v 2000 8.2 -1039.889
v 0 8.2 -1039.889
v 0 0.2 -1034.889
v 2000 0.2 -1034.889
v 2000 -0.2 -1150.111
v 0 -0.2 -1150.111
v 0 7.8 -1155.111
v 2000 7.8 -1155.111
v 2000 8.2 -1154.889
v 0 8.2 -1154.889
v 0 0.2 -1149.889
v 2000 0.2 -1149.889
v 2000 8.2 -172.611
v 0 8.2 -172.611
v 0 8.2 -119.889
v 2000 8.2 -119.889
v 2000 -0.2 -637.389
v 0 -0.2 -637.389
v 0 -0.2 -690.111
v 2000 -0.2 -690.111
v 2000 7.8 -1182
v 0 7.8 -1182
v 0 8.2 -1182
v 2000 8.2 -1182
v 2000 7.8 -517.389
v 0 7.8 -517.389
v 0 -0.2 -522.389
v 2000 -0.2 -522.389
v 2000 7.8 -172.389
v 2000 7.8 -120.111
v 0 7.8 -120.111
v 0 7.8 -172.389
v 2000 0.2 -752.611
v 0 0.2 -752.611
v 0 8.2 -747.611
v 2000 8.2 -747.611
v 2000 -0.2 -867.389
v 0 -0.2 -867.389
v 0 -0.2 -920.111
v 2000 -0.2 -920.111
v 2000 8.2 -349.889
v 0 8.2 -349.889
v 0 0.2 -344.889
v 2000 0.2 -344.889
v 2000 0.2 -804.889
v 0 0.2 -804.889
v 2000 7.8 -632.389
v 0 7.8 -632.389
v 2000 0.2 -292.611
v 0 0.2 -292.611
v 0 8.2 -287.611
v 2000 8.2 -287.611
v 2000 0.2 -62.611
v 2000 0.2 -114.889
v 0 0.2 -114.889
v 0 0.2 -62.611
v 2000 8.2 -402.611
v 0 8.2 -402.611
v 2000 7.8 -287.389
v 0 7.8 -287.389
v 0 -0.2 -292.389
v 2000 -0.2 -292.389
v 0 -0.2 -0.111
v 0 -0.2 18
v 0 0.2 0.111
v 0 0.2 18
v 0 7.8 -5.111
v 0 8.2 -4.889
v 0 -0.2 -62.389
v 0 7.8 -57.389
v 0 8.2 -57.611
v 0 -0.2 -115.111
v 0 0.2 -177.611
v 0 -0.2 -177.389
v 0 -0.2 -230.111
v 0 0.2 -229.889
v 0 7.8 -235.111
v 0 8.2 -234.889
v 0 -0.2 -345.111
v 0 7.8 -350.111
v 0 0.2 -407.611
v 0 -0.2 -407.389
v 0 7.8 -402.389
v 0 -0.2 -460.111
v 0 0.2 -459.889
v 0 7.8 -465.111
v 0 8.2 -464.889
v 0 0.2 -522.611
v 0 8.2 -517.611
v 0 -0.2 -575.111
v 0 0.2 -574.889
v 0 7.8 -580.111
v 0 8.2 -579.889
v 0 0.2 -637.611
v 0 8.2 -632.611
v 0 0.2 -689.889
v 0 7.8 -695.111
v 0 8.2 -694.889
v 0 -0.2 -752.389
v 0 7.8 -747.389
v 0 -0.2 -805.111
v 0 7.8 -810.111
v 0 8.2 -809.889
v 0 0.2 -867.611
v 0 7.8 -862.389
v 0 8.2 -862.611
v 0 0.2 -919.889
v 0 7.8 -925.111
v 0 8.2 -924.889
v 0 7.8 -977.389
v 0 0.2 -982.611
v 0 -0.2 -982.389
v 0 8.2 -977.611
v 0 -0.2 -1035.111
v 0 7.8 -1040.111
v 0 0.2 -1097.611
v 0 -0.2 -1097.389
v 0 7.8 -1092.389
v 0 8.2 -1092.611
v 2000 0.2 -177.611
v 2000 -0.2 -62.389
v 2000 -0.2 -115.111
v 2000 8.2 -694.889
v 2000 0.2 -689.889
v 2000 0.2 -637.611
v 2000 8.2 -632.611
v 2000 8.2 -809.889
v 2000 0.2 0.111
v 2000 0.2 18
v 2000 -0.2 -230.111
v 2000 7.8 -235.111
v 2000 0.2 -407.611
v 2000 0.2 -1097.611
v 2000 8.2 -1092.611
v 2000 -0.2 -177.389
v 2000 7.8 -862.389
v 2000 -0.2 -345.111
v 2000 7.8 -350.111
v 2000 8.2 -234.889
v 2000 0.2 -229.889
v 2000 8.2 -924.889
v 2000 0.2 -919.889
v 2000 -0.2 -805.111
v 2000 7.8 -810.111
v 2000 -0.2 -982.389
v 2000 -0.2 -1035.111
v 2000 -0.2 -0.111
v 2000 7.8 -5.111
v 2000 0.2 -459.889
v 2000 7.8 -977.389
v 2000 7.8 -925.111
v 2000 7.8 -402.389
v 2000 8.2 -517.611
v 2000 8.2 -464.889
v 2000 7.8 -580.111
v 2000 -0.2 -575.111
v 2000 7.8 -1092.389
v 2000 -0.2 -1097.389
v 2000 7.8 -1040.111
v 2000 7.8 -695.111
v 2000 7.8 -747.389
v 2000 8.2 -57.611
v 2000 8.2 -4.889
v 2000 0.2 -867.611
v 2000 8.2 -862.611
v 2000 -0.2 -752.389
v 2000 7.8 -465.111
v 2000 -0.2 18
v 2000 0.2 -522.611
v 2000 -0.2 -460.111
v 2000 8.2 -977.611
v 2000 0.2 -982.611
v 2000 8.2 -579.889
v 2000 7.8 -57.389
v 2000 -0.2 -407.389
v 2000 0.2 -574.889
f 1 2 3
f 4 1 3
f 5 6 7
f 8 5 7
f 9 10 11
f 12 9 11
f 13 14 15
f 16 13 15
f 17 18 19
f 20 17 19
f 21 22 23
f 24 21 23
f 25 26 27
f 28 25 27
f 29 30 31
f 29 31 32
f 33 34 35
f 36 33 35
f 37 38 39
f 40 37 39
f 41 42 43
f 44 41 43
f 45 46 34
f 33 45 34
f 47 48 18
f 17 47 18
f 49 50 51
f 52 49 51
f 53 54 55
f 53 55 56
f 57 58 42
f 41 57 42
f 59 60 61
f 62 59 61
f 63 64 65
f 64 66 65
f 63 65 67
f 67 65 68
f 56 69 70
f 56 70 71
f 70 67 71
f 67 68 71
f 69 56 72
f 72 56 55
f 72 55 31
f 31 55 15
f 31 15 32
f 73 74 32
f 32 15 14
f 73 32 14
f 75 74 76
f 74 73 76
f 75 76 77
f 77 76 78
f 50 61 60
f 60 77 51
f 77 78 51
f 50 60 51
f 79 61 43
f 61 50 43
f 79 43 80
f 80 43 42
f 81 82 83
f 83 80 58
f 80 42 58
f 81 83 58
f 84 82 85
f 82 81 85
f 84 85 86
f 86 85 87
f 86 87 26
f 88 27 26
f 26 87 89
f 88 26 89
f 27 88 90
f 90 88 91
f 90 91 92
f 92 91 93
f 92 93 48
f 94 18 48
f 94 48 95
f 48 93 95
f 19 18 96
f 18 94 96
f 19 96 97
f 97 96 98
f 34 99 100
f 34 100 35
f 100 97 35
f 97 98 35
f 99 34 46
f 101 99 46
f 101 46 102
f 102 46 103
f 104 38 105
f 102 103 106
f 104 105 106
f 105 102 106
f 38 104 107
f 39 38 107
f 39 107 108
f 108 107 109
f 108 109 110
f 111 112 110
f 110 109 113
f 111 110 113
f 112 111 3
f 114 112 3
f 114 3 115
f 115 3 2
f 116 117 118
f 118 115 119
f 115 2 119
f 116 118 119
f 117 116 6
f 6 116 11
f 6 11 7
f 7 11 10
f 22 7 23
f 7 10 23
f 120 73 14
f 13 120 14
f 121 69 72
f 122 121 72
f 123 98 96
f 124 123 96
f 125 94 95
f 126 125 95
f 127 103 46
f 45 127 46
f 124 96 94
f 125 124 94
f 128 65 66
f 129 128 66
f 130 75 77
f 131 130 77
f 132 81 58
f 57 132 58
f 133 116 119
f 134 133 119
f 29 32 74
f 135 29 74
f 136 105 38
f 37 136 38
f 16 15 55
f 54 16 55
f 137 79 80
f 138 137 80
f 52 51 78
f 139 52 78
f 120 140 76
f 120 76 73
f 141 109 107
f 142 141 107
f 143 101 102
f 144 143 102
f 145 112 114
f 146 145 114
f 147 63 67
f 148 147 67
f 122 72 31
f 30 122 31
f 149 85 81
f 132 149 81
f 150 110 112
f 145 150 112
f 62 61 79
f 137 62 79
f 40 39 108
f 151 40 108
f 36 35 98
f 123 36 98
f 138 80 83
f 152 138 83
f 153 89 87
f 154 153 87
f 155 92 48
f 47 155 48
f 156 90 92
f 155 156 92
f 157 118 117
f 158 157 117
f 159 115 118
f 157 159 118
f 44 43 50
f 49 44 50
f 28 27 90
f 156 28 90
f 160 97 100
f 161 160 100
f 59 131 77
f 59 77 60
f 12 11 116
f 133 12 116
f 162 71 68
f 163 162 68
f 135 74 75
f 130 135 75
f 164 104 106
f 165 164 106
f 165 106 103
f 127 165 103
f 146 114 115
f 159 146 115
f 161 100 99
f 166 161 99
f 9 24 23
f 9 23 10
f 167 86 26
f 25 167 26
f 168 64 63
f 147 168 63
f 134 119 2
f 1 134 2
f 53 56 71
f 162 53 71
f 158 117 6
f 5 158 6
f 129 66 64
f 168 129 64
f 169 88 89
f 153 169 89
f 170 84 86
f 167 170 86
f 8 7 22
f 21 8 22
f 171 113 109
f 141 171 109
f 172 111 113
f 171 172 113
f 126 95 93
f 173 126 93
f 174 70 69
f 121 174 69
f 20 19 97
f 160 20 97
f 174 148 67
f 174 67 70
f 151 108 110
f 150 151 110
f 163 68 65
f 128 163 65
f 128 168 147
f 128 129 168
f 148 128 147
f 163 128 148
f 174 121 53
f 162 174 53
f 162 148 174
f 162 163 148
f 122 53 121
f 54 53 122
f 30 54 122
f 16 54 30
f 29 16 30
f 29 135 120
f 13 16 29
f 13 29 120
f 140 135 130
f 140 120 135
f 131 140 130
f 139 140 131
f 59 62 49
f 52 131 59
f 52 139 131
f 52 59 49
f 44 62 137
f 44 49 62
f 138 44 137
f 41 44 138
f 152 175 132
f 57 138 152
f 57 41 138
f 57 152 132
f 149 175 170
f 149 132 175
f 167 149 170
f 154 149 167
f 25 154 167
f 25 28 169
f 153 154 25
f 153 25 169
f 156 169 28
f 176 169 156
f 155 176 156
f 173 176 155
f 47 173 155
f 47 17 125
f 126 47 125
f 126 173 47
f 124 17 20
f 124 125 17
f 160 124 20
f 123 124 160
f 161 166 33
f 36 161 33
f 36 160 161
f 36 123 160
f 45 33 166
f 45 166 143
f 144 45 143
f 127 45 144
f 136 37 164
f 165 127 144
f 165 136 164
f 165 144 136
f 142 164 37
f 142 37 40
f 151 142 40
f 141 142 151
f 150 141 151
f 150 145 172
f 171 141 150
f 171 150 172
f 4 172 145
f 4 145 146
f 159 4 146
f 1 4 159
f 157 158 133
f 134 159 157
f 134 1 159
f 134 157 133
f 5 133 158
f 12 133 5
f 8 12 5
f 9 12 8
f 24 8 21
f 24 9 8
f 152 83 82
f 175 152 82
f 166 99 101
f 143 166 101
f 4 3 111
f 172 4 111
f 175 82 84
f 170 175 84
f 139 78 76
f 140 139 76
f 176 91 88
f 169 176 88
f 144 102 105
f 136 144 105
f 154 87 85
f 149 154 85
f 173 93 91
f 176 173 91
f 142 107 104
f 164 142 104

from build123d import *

# Parameters (mm, degrees)
EXTRUDE_1_DEPTH = 2000


with BuildPart() as part:
    # Эскиз1 → Вытянуть-Тонкостенный1 (new body)
    with BuildSketch(Plane(origin=(0, 0, 0), x_dir=(0, 0, -1), z_dir=(1, 0, 0))):
        Polygon((-18, -0.2), (0.110849528, -0.2), (5.110849528, 7.8), (57.389150472, 7.8), (62.389150472, -0.2), (115.110849528, -0.2), (120.110849528, 7.8), (172.389150472, 7.8), (177.389150472, -0.2), (230.110849528, -0.2), (235.110849528, 7.8), (287.389150472, 7.8), (292.389150472, -0.2), (345.110849528, -0.2), (350.110849528, 7.8), (402.389150472, 7.8), (407.389150472, -0.2), (460.110849528, -0.2), (465.110849528, 7.8), (517.389150472, 7.8), (522.389150472, -0.2), (575.110849528, -0.2), (580.110849528, 7.8), (632.389150472, 7.8), (637.389150472, -0.2), (690.110849528, -0.2), (695.110849528, 7.8), (747.389150472, 7.8), (752.389150472, -0.2), (805.110849528, -0.2), (810.110849528, 7.8), (862.389150472, 7.8), (867.389150472, -0.2), (920.110849528, -0.2), (925.110849528, 7.8), (977.389150472, 7.8), (982.389150472, -0.2), (1035.110849528, -0.2), (1040.110849528, 7.8), (1092.389150472, 7.8), (1097.389150472, -0.2), (1150.110849528, -0.2), (1155.110849528, 7.8), (1182, 7.8), (1182, 8.2), (1154.889150472, 8.2), (1149.889150472, 0.2), (1097.610849528, 0.2), (1092.610849528, 8.2), (1039.889150472, 8.2), (1034.889150472, 0.2), (982.610849528, 0.2), (977.610849528, 8.2), (924.889150472, 8.2), (919.889150472, 0.2), (867.610849528, 0.2), (862.610849528, 8.2), (809.889150472, 8.2), (804.889150472, 0.2), (752.610849528, 0.2), (747.610849528, 8.2), (694.889150472, 8.2), (689.889150472, 0.2), (637.610849528, 0.2), (632.610849528, 8.2), (579.889150472, 8.2), (574.889150472, 0.2), (522.610849528, 0.2), (517.610849528, 8.2), (464.889150472, 8.2), (459.889150472, 0.2), (407.610849528, 0.2), (402.610849528, 8.2), (349.889150472, 8.2), (344.889150472, 0.2), (292.610849528, 0.2), (287.610849528, 8.2), (234.889150472, 8.2), (229.889150472, 0.2), (177.610849528, 0.2), (172.610849528, 8.2), (119.889150472, 8.2), (114.889150472, 0.2), (62.610849528, 0.2), (57.610849528, 8.2), (4.889150472, 8.2), (-0.110849528, 0.2), (-18, 0.2), align=None)
    extrude(amount=EXTRUDE_1_DEPTH)


solid = part.part
